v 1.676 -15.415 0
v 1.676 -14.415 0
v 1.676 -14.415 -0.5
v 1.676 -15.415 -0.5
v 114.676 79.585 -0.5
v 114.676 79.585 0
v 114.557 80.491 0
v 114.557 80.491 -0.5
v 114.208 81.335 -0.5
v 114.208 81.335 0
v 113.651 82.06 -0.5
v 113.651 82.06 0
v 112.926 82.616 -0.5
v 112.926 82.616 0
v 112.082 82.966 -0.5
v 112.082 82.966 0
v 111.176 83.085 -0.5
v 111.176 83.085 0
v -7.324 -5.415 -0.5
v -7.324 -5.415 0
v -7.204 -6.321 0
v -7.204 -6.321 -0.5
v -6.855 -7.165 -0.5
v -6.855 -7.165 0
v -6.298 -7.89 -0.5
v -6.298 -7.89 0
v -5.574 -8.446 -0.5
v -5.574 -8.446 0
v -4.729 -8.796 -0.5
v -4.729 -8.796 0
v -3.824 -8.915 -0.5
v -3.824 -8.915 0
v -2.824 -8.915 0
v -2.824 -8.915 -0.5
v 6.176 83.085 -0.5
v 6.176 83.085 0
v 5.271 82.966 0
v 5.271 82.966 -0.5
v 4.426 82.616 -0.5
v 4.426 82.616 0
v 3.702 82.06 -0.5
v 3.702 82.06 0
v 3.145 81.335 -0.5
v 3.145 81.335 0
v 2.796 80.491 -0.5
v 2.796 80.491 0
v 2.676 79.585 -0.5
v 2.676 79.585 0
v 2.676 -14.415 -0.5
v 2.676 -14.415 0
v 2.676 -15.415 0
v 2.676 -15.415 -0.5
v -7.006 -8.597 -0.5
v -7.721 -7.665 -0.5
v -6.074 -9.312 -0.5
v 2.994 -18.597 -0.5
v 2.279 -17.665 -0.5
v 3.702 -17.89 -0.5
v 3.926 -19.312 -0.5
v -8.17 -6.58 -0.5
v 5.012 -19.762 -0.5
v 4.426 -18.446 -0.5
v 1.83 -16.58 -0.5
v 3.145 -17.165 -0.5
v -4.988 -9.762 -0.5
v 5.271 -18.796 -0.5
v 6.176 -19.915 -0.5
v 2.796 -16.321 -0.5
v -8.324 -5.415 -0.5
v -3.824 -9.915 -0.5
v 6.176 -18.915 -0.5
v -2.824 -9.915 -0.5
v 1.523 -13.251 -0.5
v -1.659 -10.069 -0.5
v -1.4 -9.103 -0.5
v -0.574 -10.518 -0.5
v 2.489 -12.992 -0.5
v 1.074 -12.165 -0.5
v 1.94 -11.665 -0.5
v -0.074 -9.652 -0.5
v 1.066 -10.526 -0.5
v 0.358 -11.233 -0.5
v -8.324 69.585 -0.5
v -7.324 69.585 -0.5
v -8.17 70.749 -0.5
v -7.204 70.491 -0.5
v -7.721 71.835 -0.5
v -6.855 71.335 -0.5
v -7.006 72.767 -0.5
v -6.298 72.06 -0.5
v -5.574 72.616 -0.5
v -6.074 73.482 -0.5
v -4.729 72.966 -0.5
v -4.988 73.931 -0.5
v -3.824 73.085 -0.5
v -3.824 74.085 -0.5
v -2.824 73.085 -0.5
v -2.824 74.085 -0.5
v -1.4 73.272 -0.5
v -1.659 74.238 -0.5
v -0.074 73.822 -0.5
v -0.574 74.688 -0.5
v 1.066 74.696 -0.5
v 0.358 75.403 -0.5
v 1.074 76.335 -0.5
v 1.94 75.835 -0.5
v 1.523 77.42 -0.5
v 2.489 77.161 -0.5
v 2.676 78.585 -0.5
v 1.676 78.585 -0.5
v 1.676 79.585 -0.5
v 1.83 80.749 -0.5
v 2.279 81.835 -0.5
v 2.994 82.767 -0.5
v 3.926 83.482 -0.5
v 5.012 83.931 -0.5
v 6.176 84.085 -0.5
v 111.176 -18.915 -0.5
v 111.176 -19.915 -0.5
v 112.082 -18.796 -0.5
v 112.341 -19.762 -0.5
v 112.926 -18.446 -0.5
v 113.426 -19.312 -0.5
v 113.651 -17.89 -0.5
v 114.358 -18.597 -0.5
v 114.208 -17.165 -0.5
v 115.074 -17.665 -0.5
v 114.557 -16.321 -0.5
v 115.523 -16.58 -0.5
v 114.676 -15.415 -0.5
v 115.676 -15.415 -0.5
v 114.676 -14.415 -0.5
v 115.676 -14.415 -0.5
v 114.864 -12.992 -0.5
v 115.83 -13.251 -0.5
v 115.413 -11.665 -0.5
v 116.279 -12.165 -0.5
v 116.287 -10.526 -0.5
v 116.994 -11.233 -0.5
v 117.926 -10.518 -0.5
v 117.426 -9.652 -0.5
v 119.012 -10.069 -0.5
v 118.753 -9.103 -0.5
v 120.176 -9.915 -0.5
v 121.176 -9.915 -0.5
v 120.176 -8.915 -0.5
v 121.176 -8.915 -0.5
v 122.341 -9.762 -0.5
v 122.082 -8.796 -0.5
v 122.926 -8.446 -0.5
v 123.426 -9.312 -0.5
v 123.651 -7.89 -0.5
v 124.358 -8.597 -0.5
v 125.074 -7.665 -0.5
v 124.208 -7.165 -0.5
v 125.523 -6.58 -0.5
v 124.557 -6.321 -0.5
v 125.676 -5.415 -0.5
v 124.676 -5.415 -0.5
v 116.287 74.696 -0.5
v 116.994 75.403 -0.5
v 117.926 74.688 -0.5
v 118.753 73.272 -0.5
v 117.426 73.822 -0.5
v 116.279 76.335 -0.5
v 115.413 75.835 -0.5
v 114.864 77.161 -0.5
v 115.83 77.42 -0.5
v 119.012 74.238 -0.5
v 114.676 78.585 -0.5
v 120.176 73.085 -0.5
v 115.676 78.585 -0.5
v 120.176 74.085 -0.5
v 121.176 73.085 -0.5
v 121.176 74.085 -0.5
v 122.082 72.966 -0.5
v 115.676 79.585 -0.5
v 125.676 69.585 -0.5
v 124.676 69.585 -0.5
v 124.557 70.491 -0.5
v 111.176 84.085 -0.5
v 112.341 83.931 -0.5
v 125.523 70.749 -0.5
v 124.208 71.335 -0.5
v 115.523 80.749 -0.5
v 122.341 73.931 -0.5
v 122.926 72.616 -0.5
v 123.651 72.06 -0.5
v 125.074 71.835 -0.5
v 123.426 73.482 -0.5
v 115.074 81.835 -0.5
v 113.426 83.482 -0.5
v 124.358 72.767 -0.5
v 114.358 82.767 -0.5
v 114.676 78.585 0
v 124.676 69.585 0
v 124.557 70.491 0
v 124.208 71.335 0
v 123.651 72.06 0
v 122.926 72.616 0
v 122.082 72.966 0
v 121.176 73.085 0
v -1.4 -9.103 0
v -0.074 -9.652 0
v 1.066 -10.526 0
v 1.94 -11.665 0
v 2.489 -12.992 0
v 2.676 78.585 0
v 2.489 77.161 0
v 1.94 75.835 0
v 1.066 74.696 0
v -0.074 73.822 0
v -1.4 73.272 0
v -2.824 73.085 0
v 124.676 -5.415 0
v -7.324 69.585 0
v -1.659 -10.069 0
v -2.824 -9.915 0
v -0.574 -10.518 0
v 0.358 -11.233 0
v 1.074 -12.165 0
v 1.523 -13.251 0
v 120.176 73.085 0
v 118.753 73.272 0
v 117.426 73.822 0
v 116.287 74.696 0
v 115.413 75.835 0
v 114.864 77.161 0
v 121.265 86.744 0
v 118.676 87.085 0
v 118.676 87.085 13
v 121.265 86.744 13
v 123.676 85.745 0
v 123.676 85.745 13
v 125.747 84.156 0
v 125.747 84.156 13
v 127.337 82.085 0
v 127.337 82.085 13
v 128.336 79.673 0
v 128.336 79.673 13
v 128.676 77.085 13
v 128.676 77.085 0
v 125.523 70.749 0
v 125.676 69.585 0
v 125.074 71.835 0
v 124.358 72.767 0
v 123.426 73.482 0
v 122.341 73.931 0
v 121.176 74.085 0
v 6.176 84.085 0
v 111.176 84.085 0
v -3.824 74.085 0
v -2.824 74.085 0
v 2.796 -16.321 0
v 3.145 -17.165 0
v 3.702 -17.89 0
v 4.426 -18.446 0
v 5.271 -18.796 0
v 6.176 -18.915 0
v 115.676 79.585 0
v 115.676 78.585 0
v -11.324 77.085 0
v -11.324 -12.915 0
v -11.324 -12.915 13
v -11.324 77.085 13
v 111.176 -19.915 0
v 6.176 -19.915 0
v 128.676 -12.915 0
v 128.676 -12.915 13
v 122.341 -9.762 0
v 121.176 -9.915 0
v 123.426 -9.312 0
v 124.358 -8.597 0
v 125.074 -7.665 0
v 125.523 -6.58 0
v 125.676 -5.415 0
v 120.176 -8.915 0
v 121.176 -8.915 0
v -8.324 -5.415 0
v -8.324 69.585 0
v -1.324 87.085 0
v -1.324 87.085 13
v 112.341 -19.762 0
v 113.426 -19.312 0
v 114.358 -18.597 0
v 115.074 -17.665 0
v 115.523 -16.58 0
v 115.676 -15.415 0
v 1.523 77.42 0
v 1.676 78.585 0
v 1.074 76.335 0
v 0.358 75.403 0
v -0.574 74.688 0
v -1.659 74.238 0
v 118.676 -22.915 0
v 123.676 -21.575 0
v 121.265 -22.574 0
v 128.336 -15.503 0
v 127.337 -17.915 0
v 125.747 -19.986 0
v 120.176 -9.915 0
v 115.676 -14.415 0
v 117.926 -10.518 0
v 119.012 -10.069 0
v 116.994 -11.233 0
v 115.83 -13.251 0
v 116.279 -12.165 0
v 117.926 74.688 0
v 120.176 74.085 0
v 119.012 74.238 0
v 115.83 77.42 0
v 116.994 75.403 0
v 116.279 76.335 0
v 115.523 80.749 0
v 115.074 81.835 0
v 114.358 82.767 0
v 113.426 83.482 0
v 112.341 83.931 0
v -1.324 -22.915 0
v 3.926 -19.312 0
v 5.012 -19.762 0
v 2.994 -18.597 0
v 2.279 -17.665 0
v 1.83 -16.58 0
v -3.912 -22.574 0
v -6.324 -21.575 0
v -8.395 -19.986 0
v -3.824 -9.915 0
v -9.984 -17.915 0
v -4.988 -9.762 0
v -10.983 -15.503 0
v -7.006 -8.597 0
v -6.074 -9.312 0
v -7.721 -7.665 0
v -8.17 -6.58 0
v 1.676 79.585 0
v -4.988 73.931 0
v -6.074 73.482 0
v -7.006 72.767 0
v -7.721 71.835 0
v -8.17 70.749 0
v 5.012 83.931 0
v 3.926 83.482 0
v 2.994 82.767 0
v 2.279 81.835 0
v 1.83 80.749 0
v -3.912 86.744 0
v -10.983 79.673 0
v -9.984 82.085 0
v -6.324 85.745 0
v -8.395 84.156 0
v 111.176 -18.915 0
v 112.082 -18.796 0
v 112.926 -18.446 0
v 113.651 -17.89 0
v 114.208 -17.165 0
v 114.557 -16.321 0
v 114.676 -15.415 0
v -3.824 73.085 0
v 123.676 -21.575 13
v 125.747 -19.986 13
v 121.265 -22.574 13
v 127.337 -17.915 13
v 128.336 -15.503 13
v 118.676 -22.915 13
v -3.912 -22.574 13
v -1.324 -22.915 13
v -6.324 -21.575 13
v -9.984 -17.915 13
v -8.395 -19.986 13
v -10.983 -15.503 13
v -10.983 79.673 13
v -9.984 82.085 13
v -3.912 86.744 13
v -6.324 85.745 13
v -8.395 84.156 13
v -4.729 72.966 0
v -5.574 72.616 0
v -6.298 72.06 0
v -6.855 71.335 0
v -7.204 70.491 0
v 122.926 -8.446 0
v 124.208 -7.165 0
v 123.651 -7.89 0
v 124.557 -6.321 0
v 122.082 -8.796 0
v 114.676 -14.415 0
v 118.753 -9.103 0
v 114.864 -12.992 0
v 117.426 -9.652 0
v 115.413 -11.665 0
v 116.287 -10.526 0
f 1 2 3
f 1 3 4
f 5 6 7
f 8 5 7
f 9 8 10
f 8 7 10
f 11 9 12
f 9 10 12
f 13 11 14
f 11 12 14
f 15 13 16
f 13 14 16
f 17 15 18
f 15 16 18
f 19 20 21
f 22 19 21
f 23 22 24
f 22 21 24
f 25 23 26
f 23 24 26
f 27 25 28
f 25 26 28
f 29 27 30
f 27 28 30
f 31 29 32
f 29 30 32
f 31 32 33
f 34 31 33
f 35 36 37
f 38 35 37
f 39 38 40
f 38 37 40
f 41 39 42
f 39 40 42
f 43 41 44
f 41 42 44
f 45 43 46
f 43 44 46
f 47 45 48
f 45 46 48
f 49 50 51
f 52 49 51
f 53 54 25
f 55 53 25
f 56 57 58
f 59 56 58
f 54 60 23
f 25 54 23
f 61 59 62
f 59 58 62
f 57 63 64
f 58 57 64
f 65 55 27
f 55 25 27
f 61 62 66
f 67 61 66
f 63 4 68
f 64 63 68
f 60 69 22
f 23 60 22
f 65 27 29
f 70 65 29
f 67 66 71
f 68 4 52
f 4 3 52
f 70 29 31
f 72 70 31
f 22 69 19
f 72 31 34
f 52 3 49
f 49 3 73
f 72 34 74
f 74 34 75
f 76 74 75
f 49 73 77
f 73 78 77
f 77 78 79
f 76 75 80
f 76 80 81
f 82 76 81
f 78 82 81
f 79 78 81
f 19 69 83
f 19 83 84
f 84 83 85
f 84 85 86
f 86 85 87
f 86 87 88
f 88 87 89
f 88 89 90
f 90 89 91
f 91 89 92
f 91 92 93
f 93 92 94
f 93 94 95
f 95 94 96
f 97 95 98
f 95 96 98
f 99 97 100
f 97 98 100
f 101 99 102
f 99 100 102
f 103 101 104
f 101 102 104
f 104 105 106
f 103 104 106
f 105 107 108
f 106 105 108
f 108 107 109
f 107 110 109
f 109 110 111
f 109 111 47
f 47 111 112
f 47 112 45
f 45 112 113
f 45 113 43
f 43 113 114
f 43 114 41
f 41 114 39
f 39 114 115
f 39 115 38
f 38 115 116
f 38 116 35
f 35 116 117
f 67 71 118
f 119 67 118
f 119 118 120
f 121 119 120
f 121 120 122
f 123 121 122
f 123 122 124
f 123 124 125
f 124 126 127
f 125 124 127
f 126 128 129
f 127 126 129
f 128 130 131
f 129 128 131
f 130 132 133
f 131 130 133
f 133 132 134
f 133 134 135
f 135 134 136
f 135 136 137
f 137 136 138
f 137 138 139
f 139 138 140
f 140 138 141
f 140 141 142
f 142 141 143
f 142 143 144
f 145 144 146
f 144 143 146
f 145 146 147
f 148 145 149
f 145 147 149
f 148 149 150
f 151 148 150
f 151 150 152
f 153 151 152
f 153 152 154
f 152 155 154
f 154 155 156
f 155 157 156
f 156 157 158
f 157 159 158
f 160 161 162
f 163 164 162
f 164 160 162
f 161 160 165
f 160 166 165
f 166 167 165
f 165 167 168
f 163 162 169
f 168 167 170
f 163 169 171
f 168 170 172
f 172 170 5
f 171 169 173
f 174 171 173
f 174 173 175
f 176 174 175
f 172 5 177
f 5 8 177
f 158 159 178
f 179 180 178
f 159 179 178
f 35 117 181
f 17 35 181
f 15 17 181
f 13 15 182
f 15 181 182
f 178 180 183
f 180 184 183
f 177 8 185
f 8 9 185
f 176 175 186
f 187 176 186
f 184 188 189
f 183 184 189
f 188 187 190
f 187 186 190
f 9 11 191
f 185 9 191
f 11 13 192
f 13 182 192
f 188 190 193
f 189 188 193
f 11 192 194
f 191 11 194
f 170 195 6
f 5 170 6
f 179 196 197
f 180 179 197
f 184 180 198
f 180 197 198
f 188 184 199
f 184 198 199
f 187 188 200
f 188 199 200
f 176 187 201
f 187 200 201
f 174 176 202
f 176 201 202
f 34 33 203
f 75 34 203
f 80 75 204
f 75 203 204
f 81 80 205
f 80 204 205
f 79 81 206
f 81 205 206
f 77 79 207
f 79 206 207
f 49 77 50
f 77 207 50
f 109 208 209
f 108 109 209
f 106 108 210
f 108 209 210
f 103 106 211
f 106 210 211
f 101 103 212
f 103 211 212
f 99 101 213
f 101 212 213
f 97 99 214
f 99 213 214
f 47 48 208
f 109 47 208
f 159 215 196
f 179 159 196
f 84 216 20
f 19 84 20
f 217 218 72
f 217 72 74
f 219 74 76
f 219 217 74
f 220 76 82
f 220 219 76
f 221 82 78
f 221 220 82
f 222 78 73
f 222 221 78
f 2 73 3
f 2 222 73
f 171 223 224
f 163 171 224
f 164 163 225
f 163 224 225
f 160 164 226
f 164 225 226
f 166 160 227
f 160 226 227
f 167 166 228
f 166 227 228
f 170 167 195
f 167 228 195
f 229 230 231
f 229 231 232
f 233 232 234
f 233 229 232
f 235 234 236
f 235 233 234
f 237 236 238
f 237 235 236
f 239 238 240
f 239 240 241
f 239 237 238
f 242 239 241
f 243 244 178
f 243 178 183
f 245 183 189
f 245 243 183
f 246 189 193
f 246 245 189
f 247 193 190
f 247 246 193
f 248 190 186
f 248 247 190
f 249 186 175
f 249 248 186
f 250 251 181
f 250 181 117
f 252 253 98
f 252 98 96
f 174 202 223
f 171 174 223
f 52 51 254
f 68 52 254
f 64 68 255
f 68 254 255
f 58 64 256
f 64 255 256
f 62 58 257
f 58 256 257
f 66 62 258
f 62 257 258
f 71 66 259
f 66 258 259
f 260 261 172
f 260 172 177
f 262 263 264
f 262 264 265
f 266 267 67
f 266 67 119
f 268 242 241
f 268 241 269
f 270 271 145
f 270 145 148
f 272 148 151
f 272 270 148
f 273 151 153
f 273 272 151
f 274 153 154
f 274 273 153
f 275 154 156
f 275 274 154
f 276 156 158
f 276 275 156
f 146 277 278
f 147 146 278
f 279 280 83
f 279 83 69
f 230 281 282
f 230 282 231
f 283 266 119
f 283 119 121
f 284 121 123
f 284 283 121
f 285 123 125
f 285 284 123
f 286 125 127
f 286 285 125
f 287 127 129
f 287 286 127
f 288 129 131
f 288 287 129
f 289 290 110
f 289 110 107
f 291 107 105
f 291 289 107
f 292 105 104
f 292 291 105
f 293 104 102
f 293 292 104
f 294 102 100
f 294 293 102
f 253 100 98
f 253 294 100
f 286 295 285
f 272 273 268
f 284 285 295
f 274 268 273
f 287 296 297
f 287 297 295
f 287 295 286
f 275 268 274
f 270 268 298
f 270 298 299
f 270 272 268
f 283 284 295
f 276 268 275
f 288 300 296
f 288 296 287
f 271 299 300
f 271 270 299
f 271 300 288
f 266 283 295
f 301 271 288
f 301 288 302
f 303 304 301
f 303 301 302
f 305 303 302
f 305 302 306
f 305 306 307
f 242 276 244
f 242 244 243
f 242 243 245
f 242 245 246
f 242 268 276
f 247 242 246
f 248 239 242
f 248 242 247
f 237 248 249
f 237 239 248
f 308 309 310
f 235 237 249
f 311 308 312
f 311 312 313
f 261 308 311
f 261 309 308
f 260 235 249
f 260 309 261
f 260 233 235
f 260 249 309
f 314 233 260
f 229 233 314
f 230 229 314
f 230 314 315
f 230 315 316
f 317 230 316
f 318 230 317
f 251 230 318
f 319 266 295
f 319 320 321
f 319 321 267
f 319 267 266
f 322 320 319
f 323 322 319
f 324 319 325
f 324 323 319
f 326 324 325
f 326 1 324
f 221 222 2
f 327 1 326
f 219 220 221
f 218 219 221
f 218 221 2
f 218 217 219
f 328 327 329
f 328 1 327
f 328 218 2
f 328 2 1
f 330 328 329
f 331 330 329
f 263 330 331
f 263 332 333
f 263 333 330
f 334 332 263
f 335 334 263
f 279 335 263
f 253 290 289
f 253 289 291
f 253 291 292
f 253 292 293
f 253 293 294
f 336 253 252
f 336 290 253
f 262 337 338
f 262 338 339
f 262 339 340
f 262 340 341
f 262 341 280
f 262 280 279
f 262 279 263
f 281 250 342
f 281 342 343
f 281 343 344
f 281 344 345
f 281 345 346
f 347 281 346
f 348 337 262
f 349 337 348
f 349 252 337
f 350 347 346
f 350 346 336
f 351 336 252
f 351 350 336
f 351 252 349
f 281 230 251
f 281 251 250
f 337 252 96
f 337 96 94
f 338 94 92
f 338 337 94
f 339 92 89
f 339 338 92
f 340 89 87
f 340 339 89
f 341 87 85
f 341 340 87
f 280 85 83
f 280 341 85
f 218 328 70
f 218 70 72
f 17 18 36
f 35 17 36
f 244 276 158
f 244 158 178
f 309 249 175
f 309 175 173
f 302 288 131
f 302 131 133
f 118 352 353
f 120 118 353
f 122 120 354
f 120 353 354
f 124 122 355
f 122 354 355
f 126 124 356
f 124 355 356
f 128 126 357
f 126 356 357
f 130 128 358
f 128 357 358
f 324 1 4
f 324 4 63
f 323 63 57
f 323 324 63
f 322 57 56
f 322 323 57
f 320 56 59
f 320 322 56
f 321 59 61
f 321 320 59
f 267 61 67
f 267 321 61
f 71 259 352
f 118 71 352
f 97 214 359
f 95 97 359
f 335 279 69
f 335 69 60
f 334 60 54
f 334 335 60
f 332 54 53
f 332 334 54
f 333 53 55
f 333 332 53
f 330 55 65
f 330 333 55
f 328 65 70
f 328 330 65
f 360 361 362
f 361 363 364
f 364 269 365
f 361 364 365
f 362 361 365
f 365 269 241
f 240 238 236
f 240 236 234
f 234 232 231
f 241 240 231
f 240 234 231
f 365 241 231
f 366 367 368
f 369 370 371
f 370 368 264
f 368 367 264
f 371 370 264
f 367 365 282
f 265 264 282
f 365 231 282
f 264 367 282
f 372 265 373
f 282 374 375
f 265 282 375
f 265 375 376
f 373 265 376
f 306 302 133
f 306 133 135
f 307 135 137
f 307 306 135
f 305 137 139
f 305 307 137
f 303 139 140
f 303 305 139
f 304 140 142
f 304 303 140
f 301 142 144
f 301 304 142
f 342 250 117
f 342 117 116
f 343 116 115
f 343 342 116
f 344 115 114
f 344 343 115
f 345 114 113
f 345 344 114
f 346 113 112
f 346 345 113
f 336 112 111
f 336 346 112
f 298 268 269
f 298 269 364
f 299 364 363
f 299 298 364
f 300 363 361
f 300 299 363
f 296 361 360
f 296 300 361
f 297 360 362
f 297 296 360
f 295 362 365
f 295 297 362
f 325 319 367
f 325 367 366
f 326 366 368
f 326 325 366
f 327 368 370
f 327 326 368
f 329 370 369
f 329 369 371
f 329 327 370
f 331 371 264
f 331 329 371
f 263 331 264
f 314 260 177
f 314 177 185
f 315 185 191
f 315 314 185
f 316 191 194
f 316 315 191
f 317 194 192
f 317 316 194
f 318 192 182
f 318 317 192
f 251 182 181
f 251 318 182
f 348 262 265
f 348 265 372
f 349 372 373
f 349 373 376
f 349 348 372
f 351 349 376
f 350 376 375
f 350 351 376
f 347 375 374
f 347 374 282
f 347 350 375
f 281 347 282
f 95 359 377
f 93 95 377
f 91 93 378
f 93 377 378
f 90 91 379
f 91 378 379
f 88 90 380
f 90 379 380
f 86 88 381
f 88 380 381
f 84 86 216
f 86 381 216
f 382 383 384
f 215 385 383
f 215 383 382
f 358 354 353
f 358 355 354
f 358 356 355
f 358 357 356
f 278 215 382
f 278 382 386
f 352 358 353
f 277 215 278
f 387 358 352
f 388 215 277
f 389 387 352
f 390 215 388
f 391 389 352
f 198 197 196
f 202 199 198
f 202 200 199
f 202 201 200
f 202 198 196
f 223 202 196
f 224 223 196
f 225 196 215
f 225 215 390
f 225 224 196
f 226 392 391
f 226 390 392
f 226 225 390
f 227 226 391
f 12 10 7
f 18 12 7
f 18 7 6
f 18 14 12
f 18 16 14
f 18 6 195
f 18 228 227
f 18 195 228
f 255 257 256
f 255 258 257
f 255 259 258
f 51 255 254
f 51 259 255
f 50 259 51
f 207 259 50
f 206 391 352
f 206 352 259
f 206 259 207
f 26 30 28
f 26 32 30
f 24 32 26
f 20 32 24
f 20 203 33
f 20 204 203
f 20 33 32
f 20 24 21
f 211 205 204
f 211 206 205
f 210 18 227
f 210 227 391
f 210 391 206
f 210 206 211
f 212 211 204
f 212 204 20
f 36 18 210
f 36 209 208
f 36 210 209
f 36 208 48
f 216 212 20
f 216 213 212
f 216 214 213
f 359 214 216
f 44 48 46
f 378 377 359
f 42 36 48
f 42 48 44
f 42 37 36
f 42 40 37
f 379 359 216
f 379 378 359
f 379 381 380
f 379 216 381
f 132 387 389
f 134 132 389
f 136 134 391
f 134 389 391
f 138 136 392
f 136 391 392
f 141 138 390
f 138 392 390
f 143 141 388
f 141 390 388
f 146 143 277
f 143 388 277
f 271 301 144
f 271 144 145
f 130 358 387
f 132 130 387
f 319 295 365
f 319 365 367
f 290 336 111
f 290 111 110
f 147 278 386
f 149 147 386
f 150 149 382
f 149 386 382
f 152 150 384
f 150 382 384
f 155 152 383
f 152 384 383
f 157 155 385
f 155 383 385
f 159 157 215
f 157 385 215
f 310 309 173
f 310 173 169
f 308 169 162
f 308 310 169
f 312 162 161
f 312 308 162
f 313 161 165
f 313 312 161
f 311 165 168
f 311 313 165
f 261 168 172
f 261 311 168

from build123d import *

# Parameters (mm, degrees)
BOSS_EXTRUDE1_DEPTH = 13
BOSS_EXTRUDE3_DEPTH = 0.5


with BuildPart() as part:
    # Sketch1 → Boss-Extrude1 (new body)
    with BuildSketch(Plane.XY):
        with BuildLine():
            Line((128.676424344, 77.084775656), (128.676424344, -12.915224344))
            ThreePointArc((128.676424344, -12.915224344), (125.747492156, -19.986292156), (118.676424344, -22.915224344))
            Line((118.676424344, -22.915224344), (-1.323575656, -22.915224344))
            ThreePointArc((-1.323575656, -22.915224344), (-8.394643467, -19.986292156), (-11.323575656, -12.915224344))
            Line((-11.323575656, -12.915224344), (-11.323575656, 77.084775656))
            ThreePointArc((-11.323575656, 77.084775656), (-8.394643467, 84.155843467), (-1.323575656, 87.084775656))
            Line((-1.323575656, 87.084775656), (118.676424344, 87.084775656))
            ThreePointArc((118.676424344, 87.084775656), (125.747492156, 84.155843467), (128.676424344, 77.084775656))
        make_face()
    extrude(amount=BOSS_EXTRUDE1_DEPTH)

    # Sketch10 → Boss-Extrude3 (add)
    with BuildSketch(Plane(origin=(0, 0, 0), x_dir=(-1, 0, 0), z_dir=(0, 0, -1))):
        with BuildLine():
            Line((-121.176424344, 74.084775656), (-120.176424344, 74.084775656))
            ThreePointArc((-120.176424344, 74.084775656), (-116.994443829, 75.40279514), (-115.676424344, 78.584775656))
            Line((-115.676424344, 78.584775656), (-115.676424344, 79.584775656))
            ThreePointArc((-115.676424344, 79.584775656), (-114.35840486, 82.766756171), (-111.176424344, 84.084775656))
            Line((-111.176424344, 84.084775656), (-6.176424344, 84.084775656))
            ThreePointArc((-6.176424344, 84.084775656), (-2.994443829, 82.766756171), (-1.676424344, 79.584775656))
            Line((-1.676424344, 79.584775656), (-1.676424344, 78.584775656))
            ThreePointArc((-1.676424344, 78.584775656), (-0.35840486, 75.40279514), (2.823575656, 74.084775656))
            Line((2.823575656, 74.084775656), (3.823575656, 74.084775656))
            ThreePointArc((3.823575656, 74.084775656), (7.005556171, 72.766756171), (8.323575656, 69.584775656))
            Line((8.323575656, 69.584775656), (8.323575656, -5.415224344))
            ThreePointArc((8.323575656, -5.415224344), (7.005556171, -8.59720486), (3.823575656, -9.915224344))
            Line((3.823575656, -9.915224344), (2.823575656, -9.915224344))
            ThreePointArc((2.823575656, -9.915224344), (-0.35840486, -11.233243829), (-1.676424344, -14.415224344))
            Line((-1.676424344, -14.415224344), (-1.676424344, -15.415224344))
            ThreePointArc((-1.676424344, -15.415224344), (-2.994443829, -18.59720486), (-6.176424344, -19.915224344))
            Line((-6.176424344, -19.915224344), (-111.176424344, -19.915224344))
            ThreePointArc((-111.176424344, -19.915224344), (-114.35840486, -18.59720486), (-115.676424344, -15.415224344))
            Line((-115.676424344, -15.415224344), (-115.676424344, -14.415224344))
            ThreePointArc((-115.676424344, -14.415224344), (-116.994443829, -11.233243829), (-120.176424344, -9.915224344))
            Line((-120.176424344, -9.915224344), (-121.176424344, -9.915224344))
            ThreePointArc((-121.176424344, -9.915224344), (-124.35840486, -8.59720486), (-125.676424344, -5.415224344))
            Line((-125.676424344, -5.415224344), (-125.676424344, 69.584775656))
            ThreePointArc((-125.676424344, 69.584775656), (-124.35840486, 72.766756171), (-121.176424344, 74.084775656))
        make_face()
        with BuildLine():
            Line((-121.176424344, 73.084775656), (-120.176424344, 73.084775656))
            ThreePointArc((-120.176424344, 73.084775656), (-116.287337048, 74.695688359), (-114.676424344, 78.584775656))
            Line((-114.676424344, 78.584775656), (-114.676424344, 79.584775656))
            ThreePointArc((-114.676424344, 79.584775656), (-113.651298079, 82.05964939), (-111.176424344, 83.084775656))
            Line((-111.176424344, 83.084775656), (-6.176424344, 83.084775656))
            ThreePointArc((-6.176424344, 83.084775656), (-3.70155061, 82.05964939), (-2.676424344, 79.584775656))
            Line((-2.676424344, 79.584775656), (-2.676424344, 78.584775656))
            ThreePointArc((-2.676424344, 78.584775656), (-1.065511641, 74.695688359), (2.823575656, 73.084775656))
            Line((2.823575656, 73.084775656), (3.823575656, 73.084775656))
            ThreePointArc((3.823575656, 73.084775656), (6.29844939, 72.05964939), (7.323575656, 69.584775656))
            Line((7.323575656, 69.584775656), (7.323575656, -5.415224344))
            ThreePointArc((7.323575656, -5.415224344), (6.29844939, -7.890098079), (3.823575656, -8.915224344))
            Line((3.823575656, -8.915224344), (2.823575656, -8.915224344))
            ThreePointArc((2.823575656, -8.915224344), (-1.065511641, -10.526137048), (-2.676424344, -14.415224344))
            Line((-2.676424344, -14.415224344), (-2.676424344, -15.415224344))
            ThreePointArc((-2.676424344, -15.415224344), (-3.70155061, -17.890098079), (-6.176424344, -18.915224344))
            Line((-6.176424344, -18.915224344), (-111.176424344, -18.915224344))
            ThreePointArc((-111.176424344, -18.915224344), (-113.651298079, -17.890098079), (-114.676424344, -15.415224344))
            Line((-114.676424344, -15.415224344), (-114.676424344, -14.415224344))
            ThreePointArc((-114.676424344, -14.415224344), (-116.287337048, -10.526137048), (-120.176424344, -8.915224344))
            Line((-120.176424344, -8.915224344), (-121.176424344, -8.915224344))
            ThreePointArc((-121.176424344, -8.915224344), (-123.651298079, -7.890098079), (-124.676424344, -5.415224344))
            Line((-124.676424344, -5.415224344), (-124.676424344, 69.584775656))
            ThreePointArc((-124.676424344, 69.584775656), (-123.651298079, 72.05964939), (-121.176424344, 73.084775656))
        make_face(mode=Mode.SUBTRACT)
    extrude(amount=BOSS_EXTRUDE3_DEPTH)


solid = part.part
